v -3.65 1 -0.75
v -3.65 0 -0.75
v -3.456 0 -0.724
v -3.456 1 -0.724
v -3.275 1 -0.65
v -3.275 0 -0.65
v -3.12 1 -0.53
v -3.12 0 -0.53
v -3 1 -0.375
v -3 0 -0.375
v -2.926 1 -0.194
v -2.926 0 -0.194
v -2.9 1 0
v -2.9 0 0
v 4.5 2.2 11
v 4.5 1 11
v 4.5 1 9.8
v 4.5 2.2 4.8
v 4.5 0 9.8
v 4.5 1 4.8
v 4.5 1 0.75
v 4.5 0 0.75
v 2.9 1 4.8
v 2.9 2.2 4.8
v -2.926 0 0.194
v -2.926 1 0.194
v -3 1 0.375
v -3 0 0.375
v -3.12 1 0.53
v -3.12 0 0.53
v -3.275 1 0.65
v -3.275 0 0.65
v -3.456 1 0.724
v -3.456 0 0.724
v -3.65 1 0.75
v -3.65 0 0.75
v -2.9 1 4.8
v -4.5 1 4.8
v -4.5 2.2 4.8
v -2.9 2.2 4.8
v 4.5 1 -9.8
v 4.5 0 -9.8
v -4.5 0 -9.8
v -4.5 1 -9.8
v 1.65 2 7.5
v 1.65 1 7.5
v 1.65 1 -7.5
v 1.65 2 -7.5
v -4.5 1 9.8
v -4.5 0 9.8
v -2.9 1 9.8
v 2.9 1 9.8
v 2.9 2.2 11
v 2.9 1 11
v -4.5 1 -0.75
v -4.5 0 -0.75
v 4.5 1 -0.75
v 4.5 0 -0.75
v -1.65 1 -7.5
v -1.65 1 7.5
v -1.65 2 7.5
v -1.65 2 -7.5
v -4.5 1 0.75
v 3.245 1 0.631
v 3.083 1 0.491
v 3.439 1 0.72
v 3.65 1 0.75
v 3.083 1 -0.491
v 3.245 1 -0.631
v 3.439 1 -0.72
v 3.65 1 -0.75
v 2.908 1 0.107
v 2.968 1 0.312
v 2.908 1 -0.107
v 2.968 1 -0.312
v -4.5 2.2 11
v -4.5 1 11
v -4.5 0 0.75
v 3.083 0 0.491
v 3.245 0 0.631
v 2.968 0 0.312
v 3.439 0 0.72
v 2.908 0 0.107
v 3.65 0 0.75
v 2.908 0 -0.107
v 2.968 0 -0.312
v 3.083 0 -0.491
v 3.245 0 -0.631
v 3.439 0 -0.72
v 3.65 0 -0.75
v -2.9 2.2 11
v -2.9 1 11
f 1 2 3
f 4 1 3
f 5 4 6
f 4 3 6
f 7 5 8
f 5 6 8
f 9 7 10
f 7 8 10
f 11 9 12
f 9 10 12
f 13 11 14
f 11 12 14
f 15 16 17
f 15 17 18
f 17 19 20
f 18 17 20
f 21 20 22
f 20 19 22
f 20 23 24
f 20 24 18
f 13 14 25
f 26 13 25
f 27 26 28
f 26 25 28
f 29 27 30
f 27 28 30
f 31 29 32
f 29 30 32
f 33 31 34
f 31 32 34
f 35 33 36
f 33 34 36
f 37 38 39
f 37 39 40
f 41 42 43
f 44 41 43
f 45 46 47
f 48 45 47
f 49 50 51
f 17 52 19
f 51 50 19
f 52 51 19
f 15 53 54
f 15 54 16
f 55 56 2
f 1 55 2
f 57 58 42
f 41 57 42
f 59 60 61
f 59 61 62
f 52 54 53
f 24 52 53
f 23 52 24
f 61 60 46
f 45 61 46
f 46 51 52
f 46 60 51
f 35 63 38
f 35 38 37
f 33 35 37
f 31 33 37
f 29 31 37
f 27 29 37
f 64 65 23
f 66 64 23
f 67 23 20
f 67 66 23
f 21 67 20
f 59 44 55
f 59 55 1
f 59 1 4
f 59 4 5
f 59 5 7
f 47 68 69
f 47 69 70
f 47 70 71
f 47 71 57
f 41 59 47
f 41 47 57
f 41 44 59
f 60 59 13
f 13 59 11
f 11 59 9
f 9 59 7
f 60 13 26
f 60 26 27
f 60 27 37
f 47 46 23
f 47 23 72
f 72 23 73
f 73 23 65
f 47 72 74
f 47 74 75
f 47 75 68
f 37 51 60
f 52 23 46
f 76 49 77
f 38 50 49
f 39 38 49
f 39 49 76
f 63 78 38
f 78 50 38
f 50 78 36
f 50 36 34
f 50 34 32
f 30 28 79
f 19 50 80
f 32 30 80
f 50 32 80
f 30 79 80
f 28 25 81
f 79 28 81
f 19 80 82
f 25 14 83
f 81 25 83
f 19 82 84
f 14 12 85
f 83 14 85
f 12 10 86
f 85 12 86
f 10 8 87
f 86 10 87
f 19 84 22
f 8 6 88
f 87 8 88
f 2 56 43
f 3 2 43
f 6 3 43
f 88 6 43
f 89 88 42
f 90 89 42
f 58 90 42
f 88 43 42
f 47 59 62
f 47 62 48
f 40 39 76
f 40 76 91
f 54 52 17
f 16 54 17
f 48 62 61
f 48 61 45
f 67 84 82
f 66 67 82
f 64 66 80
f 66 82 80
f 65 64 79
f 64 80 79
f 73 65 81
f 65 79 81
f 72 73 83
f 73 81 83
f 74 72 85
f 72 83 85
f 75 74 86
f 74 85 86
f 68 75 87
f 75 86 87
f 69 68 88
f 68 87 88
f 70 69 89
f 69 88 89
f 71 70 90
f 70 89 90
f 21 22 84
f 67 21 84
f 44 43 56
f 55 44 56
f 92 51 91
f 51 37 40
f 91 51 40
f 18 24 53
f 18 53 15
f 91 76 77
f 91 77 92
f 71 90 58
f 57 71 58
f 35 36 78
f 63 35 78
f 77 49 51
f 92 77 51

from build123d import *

# Parameters (mm, degrees)
BOSS_EXTRUDE1_DEPTH = 1
SKETCH2_W           = 3.3
SKETCH2_H           = 15
BOSS_EXTRUDE2_DEPTH = 1
SKETCH3_W           = 1.6
SKETCH3_H           = 5
BOSS_EXTRUDE3_DEPTH = 1.2
SKETCH4_W           = 1.6
SKETCH4_H           = 1.2
BOSS_EXTRUDE4_DEPTH = 1.2


with BuildPart() as part:
    # Sketch1 → Boss-Extrude1 (new body)
    with BuildSketch(Plane(origin=(0, 0, 0), x_dir=(1, 0, 0), z_dir=(0, 1, 0))):
        with BuildLine():
            Line((-4.5, -0.75), (-4.5, -9.8))
            Line((-4.5, -9.8), (4.5, -9.8))
            Line((4.5, -9.8), (4.5, -0.75))
            Line((4.5, -0.75), (3.65, -0.75))
            ThreePointArc((3.65, -0.75), (2.9, 0), (3.65, 0.75))
            Line((3.65, 0.75), (4.5, 0.75))
            Line((4.5, 0.75), (4.5, 9.8))
            Line((4.5, 9.8), (-4.5, 9.8))
            Line((-4.5, 9.8), (-4.5, 0.75))
            Line((-4.5, 0.75), (-3.65, 0.75))
            ThreePointArc((-3.65, 0.75), (-3.119669914, 0.530330086), (-2.9, 0))
            ThreePointArc((-2.9, 0), (-3.119669914, -0.530330086), (-3.65, -0.75))
            Line((-3.65, -0.75), (-4.5, -0.75))
        make_face()
    extrude(amount=BOSS_EXTRUDE1_DEPTH)

    # Sketch2 → Boss-Extrude2 (add)
    with BuildSketch(Plane(origin=(0, 1, 0), x_dir=(1, 0, 0), z_dir=(0, 1, 0))):
        Rectangle(SKETCH2_W, SKETCH2_H)
    extrude(amount=BOSS_EXTRUDE2_DEPTH)

    # Sketch3 → Boss-Extrude3 (add)
    with BuildSketch(Plane(origin=(0, 1, 0), x_dir=(1, 0, 0), z_dir=(0, 1, 0))):
        with Locations((-3.7, -7.3)):
            Rectangle(SKETCH3_W, SKETCH3_H)
        with Locations((3.7, -7.3)):
            Rectangle(SKETCH3_W, SKETCH3_H)
    extrude(amount=BOSS_EXTRUDE3_DEPTH)

    # Sketch4 → Boss-Extrude4 (add)
    with BuildSketch(Plane.XY.offset(9.8)):
        with Locations((-3.7, 1.6)):
            Rectangle(SKETCH4_W, SKETCH4_H)
        with Locations((3.7, 1.6)):
            Rectangle(SKETCH4_W, SKETCH4_H)
    extrude(amount=BOSS_EXTRUDE4_DEPTH)


solid = part.part
